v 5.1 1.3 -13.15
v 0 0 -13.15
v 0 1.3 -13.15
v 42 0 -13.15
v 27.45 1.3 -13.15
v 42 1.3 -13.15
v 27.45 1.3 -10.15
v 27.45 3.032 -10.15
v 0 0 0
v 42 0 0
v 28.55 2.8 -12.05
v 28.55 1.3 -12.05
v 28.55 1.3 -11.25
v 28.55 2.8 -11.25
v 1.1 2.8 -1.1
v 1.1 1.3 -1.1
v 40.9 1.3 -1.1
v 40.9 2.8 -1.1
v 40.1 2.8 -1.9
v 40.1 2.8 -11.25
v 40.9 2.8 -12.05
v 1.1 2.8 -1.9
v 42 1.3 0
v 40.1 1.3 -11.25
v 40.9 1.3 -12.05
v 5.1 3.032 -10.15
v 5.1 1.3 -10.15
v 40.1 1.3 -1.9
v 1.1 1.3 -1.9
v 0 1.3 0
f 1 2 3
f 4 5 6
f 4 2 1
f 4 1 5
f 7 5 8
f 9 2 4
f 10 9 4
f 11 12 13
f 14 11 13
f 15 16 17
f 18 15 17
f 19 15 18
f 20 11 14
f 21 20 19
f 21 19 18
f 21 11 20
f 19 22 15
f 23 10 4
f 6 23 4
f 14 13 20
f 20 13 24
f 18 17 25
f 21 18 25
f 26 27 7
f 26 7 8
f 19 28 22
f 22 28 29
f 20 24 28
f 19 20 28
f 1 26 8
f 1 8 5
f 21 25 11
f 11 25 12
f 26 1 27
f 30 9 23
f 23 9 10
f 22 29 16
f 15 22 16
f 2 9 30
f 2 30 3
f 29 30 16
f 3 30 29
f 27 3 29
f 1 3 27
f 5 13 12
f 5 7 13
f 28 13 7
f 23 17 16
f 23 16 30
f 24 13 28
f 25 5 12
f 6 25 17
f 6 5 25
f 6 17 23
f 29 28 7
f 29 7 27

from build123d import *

# Parameters (mm, degrees)
SKETCH1_W           = 42
SKETCH1_H           = 13.15
BOSS_EXTRUDE1_DEPTH = 1.3
BOSS_EXTRUDE3_START = -5.1
BOSS_EXTRUDE3_DEPTH = 22.35
BOSS_EXTRUDE4_DEPTH = 1.5


with BuildPart() as part:
    # Sketch1 → Boss-Extrude1 (new body)
    with BuildSketch(Plane(origin=(0, 0, 0), x_dir=(1, 0, 0), z_dir=(0, 1, 0))):
        with Locations((21, 6.575)):
            Rectangle(SKETCH1_W, SKETCH1_H)
    extrude(amount=BOSS_EXTRUDE1_DEPTH)

    # Sketch3 → Boss-Extrude3 (add)
    with BuildSketch(Plane.ZY.offset(BOSS_EXTRUDE3_START)):
        Polygon((-13.15, 1.3), (-10.15, 1.3), (-10.15, 3.032050808), align=None)
    extrude(amount=-BOSS_EXTRUDE3_DEPTH)

    # Sketch4 → Boss-Extrude4 (add)
    with BuildSketch(Plane(origin=(0, 1.3, 0), x_dir=(1, 0, 0), z_dir=(0, 1, 0))):
        Polygon((40.9, 1.1), (40.9, 12.05), (28.55, 12.05), (28.55, 11.25), (40.1, 11.25), (40.1, 1.9), (1.1, 1.9), (1.1, 1.1), align=None)
    extrude(amount=BOSS_EXTRUDE4_DEPTH)


solid = part.part
